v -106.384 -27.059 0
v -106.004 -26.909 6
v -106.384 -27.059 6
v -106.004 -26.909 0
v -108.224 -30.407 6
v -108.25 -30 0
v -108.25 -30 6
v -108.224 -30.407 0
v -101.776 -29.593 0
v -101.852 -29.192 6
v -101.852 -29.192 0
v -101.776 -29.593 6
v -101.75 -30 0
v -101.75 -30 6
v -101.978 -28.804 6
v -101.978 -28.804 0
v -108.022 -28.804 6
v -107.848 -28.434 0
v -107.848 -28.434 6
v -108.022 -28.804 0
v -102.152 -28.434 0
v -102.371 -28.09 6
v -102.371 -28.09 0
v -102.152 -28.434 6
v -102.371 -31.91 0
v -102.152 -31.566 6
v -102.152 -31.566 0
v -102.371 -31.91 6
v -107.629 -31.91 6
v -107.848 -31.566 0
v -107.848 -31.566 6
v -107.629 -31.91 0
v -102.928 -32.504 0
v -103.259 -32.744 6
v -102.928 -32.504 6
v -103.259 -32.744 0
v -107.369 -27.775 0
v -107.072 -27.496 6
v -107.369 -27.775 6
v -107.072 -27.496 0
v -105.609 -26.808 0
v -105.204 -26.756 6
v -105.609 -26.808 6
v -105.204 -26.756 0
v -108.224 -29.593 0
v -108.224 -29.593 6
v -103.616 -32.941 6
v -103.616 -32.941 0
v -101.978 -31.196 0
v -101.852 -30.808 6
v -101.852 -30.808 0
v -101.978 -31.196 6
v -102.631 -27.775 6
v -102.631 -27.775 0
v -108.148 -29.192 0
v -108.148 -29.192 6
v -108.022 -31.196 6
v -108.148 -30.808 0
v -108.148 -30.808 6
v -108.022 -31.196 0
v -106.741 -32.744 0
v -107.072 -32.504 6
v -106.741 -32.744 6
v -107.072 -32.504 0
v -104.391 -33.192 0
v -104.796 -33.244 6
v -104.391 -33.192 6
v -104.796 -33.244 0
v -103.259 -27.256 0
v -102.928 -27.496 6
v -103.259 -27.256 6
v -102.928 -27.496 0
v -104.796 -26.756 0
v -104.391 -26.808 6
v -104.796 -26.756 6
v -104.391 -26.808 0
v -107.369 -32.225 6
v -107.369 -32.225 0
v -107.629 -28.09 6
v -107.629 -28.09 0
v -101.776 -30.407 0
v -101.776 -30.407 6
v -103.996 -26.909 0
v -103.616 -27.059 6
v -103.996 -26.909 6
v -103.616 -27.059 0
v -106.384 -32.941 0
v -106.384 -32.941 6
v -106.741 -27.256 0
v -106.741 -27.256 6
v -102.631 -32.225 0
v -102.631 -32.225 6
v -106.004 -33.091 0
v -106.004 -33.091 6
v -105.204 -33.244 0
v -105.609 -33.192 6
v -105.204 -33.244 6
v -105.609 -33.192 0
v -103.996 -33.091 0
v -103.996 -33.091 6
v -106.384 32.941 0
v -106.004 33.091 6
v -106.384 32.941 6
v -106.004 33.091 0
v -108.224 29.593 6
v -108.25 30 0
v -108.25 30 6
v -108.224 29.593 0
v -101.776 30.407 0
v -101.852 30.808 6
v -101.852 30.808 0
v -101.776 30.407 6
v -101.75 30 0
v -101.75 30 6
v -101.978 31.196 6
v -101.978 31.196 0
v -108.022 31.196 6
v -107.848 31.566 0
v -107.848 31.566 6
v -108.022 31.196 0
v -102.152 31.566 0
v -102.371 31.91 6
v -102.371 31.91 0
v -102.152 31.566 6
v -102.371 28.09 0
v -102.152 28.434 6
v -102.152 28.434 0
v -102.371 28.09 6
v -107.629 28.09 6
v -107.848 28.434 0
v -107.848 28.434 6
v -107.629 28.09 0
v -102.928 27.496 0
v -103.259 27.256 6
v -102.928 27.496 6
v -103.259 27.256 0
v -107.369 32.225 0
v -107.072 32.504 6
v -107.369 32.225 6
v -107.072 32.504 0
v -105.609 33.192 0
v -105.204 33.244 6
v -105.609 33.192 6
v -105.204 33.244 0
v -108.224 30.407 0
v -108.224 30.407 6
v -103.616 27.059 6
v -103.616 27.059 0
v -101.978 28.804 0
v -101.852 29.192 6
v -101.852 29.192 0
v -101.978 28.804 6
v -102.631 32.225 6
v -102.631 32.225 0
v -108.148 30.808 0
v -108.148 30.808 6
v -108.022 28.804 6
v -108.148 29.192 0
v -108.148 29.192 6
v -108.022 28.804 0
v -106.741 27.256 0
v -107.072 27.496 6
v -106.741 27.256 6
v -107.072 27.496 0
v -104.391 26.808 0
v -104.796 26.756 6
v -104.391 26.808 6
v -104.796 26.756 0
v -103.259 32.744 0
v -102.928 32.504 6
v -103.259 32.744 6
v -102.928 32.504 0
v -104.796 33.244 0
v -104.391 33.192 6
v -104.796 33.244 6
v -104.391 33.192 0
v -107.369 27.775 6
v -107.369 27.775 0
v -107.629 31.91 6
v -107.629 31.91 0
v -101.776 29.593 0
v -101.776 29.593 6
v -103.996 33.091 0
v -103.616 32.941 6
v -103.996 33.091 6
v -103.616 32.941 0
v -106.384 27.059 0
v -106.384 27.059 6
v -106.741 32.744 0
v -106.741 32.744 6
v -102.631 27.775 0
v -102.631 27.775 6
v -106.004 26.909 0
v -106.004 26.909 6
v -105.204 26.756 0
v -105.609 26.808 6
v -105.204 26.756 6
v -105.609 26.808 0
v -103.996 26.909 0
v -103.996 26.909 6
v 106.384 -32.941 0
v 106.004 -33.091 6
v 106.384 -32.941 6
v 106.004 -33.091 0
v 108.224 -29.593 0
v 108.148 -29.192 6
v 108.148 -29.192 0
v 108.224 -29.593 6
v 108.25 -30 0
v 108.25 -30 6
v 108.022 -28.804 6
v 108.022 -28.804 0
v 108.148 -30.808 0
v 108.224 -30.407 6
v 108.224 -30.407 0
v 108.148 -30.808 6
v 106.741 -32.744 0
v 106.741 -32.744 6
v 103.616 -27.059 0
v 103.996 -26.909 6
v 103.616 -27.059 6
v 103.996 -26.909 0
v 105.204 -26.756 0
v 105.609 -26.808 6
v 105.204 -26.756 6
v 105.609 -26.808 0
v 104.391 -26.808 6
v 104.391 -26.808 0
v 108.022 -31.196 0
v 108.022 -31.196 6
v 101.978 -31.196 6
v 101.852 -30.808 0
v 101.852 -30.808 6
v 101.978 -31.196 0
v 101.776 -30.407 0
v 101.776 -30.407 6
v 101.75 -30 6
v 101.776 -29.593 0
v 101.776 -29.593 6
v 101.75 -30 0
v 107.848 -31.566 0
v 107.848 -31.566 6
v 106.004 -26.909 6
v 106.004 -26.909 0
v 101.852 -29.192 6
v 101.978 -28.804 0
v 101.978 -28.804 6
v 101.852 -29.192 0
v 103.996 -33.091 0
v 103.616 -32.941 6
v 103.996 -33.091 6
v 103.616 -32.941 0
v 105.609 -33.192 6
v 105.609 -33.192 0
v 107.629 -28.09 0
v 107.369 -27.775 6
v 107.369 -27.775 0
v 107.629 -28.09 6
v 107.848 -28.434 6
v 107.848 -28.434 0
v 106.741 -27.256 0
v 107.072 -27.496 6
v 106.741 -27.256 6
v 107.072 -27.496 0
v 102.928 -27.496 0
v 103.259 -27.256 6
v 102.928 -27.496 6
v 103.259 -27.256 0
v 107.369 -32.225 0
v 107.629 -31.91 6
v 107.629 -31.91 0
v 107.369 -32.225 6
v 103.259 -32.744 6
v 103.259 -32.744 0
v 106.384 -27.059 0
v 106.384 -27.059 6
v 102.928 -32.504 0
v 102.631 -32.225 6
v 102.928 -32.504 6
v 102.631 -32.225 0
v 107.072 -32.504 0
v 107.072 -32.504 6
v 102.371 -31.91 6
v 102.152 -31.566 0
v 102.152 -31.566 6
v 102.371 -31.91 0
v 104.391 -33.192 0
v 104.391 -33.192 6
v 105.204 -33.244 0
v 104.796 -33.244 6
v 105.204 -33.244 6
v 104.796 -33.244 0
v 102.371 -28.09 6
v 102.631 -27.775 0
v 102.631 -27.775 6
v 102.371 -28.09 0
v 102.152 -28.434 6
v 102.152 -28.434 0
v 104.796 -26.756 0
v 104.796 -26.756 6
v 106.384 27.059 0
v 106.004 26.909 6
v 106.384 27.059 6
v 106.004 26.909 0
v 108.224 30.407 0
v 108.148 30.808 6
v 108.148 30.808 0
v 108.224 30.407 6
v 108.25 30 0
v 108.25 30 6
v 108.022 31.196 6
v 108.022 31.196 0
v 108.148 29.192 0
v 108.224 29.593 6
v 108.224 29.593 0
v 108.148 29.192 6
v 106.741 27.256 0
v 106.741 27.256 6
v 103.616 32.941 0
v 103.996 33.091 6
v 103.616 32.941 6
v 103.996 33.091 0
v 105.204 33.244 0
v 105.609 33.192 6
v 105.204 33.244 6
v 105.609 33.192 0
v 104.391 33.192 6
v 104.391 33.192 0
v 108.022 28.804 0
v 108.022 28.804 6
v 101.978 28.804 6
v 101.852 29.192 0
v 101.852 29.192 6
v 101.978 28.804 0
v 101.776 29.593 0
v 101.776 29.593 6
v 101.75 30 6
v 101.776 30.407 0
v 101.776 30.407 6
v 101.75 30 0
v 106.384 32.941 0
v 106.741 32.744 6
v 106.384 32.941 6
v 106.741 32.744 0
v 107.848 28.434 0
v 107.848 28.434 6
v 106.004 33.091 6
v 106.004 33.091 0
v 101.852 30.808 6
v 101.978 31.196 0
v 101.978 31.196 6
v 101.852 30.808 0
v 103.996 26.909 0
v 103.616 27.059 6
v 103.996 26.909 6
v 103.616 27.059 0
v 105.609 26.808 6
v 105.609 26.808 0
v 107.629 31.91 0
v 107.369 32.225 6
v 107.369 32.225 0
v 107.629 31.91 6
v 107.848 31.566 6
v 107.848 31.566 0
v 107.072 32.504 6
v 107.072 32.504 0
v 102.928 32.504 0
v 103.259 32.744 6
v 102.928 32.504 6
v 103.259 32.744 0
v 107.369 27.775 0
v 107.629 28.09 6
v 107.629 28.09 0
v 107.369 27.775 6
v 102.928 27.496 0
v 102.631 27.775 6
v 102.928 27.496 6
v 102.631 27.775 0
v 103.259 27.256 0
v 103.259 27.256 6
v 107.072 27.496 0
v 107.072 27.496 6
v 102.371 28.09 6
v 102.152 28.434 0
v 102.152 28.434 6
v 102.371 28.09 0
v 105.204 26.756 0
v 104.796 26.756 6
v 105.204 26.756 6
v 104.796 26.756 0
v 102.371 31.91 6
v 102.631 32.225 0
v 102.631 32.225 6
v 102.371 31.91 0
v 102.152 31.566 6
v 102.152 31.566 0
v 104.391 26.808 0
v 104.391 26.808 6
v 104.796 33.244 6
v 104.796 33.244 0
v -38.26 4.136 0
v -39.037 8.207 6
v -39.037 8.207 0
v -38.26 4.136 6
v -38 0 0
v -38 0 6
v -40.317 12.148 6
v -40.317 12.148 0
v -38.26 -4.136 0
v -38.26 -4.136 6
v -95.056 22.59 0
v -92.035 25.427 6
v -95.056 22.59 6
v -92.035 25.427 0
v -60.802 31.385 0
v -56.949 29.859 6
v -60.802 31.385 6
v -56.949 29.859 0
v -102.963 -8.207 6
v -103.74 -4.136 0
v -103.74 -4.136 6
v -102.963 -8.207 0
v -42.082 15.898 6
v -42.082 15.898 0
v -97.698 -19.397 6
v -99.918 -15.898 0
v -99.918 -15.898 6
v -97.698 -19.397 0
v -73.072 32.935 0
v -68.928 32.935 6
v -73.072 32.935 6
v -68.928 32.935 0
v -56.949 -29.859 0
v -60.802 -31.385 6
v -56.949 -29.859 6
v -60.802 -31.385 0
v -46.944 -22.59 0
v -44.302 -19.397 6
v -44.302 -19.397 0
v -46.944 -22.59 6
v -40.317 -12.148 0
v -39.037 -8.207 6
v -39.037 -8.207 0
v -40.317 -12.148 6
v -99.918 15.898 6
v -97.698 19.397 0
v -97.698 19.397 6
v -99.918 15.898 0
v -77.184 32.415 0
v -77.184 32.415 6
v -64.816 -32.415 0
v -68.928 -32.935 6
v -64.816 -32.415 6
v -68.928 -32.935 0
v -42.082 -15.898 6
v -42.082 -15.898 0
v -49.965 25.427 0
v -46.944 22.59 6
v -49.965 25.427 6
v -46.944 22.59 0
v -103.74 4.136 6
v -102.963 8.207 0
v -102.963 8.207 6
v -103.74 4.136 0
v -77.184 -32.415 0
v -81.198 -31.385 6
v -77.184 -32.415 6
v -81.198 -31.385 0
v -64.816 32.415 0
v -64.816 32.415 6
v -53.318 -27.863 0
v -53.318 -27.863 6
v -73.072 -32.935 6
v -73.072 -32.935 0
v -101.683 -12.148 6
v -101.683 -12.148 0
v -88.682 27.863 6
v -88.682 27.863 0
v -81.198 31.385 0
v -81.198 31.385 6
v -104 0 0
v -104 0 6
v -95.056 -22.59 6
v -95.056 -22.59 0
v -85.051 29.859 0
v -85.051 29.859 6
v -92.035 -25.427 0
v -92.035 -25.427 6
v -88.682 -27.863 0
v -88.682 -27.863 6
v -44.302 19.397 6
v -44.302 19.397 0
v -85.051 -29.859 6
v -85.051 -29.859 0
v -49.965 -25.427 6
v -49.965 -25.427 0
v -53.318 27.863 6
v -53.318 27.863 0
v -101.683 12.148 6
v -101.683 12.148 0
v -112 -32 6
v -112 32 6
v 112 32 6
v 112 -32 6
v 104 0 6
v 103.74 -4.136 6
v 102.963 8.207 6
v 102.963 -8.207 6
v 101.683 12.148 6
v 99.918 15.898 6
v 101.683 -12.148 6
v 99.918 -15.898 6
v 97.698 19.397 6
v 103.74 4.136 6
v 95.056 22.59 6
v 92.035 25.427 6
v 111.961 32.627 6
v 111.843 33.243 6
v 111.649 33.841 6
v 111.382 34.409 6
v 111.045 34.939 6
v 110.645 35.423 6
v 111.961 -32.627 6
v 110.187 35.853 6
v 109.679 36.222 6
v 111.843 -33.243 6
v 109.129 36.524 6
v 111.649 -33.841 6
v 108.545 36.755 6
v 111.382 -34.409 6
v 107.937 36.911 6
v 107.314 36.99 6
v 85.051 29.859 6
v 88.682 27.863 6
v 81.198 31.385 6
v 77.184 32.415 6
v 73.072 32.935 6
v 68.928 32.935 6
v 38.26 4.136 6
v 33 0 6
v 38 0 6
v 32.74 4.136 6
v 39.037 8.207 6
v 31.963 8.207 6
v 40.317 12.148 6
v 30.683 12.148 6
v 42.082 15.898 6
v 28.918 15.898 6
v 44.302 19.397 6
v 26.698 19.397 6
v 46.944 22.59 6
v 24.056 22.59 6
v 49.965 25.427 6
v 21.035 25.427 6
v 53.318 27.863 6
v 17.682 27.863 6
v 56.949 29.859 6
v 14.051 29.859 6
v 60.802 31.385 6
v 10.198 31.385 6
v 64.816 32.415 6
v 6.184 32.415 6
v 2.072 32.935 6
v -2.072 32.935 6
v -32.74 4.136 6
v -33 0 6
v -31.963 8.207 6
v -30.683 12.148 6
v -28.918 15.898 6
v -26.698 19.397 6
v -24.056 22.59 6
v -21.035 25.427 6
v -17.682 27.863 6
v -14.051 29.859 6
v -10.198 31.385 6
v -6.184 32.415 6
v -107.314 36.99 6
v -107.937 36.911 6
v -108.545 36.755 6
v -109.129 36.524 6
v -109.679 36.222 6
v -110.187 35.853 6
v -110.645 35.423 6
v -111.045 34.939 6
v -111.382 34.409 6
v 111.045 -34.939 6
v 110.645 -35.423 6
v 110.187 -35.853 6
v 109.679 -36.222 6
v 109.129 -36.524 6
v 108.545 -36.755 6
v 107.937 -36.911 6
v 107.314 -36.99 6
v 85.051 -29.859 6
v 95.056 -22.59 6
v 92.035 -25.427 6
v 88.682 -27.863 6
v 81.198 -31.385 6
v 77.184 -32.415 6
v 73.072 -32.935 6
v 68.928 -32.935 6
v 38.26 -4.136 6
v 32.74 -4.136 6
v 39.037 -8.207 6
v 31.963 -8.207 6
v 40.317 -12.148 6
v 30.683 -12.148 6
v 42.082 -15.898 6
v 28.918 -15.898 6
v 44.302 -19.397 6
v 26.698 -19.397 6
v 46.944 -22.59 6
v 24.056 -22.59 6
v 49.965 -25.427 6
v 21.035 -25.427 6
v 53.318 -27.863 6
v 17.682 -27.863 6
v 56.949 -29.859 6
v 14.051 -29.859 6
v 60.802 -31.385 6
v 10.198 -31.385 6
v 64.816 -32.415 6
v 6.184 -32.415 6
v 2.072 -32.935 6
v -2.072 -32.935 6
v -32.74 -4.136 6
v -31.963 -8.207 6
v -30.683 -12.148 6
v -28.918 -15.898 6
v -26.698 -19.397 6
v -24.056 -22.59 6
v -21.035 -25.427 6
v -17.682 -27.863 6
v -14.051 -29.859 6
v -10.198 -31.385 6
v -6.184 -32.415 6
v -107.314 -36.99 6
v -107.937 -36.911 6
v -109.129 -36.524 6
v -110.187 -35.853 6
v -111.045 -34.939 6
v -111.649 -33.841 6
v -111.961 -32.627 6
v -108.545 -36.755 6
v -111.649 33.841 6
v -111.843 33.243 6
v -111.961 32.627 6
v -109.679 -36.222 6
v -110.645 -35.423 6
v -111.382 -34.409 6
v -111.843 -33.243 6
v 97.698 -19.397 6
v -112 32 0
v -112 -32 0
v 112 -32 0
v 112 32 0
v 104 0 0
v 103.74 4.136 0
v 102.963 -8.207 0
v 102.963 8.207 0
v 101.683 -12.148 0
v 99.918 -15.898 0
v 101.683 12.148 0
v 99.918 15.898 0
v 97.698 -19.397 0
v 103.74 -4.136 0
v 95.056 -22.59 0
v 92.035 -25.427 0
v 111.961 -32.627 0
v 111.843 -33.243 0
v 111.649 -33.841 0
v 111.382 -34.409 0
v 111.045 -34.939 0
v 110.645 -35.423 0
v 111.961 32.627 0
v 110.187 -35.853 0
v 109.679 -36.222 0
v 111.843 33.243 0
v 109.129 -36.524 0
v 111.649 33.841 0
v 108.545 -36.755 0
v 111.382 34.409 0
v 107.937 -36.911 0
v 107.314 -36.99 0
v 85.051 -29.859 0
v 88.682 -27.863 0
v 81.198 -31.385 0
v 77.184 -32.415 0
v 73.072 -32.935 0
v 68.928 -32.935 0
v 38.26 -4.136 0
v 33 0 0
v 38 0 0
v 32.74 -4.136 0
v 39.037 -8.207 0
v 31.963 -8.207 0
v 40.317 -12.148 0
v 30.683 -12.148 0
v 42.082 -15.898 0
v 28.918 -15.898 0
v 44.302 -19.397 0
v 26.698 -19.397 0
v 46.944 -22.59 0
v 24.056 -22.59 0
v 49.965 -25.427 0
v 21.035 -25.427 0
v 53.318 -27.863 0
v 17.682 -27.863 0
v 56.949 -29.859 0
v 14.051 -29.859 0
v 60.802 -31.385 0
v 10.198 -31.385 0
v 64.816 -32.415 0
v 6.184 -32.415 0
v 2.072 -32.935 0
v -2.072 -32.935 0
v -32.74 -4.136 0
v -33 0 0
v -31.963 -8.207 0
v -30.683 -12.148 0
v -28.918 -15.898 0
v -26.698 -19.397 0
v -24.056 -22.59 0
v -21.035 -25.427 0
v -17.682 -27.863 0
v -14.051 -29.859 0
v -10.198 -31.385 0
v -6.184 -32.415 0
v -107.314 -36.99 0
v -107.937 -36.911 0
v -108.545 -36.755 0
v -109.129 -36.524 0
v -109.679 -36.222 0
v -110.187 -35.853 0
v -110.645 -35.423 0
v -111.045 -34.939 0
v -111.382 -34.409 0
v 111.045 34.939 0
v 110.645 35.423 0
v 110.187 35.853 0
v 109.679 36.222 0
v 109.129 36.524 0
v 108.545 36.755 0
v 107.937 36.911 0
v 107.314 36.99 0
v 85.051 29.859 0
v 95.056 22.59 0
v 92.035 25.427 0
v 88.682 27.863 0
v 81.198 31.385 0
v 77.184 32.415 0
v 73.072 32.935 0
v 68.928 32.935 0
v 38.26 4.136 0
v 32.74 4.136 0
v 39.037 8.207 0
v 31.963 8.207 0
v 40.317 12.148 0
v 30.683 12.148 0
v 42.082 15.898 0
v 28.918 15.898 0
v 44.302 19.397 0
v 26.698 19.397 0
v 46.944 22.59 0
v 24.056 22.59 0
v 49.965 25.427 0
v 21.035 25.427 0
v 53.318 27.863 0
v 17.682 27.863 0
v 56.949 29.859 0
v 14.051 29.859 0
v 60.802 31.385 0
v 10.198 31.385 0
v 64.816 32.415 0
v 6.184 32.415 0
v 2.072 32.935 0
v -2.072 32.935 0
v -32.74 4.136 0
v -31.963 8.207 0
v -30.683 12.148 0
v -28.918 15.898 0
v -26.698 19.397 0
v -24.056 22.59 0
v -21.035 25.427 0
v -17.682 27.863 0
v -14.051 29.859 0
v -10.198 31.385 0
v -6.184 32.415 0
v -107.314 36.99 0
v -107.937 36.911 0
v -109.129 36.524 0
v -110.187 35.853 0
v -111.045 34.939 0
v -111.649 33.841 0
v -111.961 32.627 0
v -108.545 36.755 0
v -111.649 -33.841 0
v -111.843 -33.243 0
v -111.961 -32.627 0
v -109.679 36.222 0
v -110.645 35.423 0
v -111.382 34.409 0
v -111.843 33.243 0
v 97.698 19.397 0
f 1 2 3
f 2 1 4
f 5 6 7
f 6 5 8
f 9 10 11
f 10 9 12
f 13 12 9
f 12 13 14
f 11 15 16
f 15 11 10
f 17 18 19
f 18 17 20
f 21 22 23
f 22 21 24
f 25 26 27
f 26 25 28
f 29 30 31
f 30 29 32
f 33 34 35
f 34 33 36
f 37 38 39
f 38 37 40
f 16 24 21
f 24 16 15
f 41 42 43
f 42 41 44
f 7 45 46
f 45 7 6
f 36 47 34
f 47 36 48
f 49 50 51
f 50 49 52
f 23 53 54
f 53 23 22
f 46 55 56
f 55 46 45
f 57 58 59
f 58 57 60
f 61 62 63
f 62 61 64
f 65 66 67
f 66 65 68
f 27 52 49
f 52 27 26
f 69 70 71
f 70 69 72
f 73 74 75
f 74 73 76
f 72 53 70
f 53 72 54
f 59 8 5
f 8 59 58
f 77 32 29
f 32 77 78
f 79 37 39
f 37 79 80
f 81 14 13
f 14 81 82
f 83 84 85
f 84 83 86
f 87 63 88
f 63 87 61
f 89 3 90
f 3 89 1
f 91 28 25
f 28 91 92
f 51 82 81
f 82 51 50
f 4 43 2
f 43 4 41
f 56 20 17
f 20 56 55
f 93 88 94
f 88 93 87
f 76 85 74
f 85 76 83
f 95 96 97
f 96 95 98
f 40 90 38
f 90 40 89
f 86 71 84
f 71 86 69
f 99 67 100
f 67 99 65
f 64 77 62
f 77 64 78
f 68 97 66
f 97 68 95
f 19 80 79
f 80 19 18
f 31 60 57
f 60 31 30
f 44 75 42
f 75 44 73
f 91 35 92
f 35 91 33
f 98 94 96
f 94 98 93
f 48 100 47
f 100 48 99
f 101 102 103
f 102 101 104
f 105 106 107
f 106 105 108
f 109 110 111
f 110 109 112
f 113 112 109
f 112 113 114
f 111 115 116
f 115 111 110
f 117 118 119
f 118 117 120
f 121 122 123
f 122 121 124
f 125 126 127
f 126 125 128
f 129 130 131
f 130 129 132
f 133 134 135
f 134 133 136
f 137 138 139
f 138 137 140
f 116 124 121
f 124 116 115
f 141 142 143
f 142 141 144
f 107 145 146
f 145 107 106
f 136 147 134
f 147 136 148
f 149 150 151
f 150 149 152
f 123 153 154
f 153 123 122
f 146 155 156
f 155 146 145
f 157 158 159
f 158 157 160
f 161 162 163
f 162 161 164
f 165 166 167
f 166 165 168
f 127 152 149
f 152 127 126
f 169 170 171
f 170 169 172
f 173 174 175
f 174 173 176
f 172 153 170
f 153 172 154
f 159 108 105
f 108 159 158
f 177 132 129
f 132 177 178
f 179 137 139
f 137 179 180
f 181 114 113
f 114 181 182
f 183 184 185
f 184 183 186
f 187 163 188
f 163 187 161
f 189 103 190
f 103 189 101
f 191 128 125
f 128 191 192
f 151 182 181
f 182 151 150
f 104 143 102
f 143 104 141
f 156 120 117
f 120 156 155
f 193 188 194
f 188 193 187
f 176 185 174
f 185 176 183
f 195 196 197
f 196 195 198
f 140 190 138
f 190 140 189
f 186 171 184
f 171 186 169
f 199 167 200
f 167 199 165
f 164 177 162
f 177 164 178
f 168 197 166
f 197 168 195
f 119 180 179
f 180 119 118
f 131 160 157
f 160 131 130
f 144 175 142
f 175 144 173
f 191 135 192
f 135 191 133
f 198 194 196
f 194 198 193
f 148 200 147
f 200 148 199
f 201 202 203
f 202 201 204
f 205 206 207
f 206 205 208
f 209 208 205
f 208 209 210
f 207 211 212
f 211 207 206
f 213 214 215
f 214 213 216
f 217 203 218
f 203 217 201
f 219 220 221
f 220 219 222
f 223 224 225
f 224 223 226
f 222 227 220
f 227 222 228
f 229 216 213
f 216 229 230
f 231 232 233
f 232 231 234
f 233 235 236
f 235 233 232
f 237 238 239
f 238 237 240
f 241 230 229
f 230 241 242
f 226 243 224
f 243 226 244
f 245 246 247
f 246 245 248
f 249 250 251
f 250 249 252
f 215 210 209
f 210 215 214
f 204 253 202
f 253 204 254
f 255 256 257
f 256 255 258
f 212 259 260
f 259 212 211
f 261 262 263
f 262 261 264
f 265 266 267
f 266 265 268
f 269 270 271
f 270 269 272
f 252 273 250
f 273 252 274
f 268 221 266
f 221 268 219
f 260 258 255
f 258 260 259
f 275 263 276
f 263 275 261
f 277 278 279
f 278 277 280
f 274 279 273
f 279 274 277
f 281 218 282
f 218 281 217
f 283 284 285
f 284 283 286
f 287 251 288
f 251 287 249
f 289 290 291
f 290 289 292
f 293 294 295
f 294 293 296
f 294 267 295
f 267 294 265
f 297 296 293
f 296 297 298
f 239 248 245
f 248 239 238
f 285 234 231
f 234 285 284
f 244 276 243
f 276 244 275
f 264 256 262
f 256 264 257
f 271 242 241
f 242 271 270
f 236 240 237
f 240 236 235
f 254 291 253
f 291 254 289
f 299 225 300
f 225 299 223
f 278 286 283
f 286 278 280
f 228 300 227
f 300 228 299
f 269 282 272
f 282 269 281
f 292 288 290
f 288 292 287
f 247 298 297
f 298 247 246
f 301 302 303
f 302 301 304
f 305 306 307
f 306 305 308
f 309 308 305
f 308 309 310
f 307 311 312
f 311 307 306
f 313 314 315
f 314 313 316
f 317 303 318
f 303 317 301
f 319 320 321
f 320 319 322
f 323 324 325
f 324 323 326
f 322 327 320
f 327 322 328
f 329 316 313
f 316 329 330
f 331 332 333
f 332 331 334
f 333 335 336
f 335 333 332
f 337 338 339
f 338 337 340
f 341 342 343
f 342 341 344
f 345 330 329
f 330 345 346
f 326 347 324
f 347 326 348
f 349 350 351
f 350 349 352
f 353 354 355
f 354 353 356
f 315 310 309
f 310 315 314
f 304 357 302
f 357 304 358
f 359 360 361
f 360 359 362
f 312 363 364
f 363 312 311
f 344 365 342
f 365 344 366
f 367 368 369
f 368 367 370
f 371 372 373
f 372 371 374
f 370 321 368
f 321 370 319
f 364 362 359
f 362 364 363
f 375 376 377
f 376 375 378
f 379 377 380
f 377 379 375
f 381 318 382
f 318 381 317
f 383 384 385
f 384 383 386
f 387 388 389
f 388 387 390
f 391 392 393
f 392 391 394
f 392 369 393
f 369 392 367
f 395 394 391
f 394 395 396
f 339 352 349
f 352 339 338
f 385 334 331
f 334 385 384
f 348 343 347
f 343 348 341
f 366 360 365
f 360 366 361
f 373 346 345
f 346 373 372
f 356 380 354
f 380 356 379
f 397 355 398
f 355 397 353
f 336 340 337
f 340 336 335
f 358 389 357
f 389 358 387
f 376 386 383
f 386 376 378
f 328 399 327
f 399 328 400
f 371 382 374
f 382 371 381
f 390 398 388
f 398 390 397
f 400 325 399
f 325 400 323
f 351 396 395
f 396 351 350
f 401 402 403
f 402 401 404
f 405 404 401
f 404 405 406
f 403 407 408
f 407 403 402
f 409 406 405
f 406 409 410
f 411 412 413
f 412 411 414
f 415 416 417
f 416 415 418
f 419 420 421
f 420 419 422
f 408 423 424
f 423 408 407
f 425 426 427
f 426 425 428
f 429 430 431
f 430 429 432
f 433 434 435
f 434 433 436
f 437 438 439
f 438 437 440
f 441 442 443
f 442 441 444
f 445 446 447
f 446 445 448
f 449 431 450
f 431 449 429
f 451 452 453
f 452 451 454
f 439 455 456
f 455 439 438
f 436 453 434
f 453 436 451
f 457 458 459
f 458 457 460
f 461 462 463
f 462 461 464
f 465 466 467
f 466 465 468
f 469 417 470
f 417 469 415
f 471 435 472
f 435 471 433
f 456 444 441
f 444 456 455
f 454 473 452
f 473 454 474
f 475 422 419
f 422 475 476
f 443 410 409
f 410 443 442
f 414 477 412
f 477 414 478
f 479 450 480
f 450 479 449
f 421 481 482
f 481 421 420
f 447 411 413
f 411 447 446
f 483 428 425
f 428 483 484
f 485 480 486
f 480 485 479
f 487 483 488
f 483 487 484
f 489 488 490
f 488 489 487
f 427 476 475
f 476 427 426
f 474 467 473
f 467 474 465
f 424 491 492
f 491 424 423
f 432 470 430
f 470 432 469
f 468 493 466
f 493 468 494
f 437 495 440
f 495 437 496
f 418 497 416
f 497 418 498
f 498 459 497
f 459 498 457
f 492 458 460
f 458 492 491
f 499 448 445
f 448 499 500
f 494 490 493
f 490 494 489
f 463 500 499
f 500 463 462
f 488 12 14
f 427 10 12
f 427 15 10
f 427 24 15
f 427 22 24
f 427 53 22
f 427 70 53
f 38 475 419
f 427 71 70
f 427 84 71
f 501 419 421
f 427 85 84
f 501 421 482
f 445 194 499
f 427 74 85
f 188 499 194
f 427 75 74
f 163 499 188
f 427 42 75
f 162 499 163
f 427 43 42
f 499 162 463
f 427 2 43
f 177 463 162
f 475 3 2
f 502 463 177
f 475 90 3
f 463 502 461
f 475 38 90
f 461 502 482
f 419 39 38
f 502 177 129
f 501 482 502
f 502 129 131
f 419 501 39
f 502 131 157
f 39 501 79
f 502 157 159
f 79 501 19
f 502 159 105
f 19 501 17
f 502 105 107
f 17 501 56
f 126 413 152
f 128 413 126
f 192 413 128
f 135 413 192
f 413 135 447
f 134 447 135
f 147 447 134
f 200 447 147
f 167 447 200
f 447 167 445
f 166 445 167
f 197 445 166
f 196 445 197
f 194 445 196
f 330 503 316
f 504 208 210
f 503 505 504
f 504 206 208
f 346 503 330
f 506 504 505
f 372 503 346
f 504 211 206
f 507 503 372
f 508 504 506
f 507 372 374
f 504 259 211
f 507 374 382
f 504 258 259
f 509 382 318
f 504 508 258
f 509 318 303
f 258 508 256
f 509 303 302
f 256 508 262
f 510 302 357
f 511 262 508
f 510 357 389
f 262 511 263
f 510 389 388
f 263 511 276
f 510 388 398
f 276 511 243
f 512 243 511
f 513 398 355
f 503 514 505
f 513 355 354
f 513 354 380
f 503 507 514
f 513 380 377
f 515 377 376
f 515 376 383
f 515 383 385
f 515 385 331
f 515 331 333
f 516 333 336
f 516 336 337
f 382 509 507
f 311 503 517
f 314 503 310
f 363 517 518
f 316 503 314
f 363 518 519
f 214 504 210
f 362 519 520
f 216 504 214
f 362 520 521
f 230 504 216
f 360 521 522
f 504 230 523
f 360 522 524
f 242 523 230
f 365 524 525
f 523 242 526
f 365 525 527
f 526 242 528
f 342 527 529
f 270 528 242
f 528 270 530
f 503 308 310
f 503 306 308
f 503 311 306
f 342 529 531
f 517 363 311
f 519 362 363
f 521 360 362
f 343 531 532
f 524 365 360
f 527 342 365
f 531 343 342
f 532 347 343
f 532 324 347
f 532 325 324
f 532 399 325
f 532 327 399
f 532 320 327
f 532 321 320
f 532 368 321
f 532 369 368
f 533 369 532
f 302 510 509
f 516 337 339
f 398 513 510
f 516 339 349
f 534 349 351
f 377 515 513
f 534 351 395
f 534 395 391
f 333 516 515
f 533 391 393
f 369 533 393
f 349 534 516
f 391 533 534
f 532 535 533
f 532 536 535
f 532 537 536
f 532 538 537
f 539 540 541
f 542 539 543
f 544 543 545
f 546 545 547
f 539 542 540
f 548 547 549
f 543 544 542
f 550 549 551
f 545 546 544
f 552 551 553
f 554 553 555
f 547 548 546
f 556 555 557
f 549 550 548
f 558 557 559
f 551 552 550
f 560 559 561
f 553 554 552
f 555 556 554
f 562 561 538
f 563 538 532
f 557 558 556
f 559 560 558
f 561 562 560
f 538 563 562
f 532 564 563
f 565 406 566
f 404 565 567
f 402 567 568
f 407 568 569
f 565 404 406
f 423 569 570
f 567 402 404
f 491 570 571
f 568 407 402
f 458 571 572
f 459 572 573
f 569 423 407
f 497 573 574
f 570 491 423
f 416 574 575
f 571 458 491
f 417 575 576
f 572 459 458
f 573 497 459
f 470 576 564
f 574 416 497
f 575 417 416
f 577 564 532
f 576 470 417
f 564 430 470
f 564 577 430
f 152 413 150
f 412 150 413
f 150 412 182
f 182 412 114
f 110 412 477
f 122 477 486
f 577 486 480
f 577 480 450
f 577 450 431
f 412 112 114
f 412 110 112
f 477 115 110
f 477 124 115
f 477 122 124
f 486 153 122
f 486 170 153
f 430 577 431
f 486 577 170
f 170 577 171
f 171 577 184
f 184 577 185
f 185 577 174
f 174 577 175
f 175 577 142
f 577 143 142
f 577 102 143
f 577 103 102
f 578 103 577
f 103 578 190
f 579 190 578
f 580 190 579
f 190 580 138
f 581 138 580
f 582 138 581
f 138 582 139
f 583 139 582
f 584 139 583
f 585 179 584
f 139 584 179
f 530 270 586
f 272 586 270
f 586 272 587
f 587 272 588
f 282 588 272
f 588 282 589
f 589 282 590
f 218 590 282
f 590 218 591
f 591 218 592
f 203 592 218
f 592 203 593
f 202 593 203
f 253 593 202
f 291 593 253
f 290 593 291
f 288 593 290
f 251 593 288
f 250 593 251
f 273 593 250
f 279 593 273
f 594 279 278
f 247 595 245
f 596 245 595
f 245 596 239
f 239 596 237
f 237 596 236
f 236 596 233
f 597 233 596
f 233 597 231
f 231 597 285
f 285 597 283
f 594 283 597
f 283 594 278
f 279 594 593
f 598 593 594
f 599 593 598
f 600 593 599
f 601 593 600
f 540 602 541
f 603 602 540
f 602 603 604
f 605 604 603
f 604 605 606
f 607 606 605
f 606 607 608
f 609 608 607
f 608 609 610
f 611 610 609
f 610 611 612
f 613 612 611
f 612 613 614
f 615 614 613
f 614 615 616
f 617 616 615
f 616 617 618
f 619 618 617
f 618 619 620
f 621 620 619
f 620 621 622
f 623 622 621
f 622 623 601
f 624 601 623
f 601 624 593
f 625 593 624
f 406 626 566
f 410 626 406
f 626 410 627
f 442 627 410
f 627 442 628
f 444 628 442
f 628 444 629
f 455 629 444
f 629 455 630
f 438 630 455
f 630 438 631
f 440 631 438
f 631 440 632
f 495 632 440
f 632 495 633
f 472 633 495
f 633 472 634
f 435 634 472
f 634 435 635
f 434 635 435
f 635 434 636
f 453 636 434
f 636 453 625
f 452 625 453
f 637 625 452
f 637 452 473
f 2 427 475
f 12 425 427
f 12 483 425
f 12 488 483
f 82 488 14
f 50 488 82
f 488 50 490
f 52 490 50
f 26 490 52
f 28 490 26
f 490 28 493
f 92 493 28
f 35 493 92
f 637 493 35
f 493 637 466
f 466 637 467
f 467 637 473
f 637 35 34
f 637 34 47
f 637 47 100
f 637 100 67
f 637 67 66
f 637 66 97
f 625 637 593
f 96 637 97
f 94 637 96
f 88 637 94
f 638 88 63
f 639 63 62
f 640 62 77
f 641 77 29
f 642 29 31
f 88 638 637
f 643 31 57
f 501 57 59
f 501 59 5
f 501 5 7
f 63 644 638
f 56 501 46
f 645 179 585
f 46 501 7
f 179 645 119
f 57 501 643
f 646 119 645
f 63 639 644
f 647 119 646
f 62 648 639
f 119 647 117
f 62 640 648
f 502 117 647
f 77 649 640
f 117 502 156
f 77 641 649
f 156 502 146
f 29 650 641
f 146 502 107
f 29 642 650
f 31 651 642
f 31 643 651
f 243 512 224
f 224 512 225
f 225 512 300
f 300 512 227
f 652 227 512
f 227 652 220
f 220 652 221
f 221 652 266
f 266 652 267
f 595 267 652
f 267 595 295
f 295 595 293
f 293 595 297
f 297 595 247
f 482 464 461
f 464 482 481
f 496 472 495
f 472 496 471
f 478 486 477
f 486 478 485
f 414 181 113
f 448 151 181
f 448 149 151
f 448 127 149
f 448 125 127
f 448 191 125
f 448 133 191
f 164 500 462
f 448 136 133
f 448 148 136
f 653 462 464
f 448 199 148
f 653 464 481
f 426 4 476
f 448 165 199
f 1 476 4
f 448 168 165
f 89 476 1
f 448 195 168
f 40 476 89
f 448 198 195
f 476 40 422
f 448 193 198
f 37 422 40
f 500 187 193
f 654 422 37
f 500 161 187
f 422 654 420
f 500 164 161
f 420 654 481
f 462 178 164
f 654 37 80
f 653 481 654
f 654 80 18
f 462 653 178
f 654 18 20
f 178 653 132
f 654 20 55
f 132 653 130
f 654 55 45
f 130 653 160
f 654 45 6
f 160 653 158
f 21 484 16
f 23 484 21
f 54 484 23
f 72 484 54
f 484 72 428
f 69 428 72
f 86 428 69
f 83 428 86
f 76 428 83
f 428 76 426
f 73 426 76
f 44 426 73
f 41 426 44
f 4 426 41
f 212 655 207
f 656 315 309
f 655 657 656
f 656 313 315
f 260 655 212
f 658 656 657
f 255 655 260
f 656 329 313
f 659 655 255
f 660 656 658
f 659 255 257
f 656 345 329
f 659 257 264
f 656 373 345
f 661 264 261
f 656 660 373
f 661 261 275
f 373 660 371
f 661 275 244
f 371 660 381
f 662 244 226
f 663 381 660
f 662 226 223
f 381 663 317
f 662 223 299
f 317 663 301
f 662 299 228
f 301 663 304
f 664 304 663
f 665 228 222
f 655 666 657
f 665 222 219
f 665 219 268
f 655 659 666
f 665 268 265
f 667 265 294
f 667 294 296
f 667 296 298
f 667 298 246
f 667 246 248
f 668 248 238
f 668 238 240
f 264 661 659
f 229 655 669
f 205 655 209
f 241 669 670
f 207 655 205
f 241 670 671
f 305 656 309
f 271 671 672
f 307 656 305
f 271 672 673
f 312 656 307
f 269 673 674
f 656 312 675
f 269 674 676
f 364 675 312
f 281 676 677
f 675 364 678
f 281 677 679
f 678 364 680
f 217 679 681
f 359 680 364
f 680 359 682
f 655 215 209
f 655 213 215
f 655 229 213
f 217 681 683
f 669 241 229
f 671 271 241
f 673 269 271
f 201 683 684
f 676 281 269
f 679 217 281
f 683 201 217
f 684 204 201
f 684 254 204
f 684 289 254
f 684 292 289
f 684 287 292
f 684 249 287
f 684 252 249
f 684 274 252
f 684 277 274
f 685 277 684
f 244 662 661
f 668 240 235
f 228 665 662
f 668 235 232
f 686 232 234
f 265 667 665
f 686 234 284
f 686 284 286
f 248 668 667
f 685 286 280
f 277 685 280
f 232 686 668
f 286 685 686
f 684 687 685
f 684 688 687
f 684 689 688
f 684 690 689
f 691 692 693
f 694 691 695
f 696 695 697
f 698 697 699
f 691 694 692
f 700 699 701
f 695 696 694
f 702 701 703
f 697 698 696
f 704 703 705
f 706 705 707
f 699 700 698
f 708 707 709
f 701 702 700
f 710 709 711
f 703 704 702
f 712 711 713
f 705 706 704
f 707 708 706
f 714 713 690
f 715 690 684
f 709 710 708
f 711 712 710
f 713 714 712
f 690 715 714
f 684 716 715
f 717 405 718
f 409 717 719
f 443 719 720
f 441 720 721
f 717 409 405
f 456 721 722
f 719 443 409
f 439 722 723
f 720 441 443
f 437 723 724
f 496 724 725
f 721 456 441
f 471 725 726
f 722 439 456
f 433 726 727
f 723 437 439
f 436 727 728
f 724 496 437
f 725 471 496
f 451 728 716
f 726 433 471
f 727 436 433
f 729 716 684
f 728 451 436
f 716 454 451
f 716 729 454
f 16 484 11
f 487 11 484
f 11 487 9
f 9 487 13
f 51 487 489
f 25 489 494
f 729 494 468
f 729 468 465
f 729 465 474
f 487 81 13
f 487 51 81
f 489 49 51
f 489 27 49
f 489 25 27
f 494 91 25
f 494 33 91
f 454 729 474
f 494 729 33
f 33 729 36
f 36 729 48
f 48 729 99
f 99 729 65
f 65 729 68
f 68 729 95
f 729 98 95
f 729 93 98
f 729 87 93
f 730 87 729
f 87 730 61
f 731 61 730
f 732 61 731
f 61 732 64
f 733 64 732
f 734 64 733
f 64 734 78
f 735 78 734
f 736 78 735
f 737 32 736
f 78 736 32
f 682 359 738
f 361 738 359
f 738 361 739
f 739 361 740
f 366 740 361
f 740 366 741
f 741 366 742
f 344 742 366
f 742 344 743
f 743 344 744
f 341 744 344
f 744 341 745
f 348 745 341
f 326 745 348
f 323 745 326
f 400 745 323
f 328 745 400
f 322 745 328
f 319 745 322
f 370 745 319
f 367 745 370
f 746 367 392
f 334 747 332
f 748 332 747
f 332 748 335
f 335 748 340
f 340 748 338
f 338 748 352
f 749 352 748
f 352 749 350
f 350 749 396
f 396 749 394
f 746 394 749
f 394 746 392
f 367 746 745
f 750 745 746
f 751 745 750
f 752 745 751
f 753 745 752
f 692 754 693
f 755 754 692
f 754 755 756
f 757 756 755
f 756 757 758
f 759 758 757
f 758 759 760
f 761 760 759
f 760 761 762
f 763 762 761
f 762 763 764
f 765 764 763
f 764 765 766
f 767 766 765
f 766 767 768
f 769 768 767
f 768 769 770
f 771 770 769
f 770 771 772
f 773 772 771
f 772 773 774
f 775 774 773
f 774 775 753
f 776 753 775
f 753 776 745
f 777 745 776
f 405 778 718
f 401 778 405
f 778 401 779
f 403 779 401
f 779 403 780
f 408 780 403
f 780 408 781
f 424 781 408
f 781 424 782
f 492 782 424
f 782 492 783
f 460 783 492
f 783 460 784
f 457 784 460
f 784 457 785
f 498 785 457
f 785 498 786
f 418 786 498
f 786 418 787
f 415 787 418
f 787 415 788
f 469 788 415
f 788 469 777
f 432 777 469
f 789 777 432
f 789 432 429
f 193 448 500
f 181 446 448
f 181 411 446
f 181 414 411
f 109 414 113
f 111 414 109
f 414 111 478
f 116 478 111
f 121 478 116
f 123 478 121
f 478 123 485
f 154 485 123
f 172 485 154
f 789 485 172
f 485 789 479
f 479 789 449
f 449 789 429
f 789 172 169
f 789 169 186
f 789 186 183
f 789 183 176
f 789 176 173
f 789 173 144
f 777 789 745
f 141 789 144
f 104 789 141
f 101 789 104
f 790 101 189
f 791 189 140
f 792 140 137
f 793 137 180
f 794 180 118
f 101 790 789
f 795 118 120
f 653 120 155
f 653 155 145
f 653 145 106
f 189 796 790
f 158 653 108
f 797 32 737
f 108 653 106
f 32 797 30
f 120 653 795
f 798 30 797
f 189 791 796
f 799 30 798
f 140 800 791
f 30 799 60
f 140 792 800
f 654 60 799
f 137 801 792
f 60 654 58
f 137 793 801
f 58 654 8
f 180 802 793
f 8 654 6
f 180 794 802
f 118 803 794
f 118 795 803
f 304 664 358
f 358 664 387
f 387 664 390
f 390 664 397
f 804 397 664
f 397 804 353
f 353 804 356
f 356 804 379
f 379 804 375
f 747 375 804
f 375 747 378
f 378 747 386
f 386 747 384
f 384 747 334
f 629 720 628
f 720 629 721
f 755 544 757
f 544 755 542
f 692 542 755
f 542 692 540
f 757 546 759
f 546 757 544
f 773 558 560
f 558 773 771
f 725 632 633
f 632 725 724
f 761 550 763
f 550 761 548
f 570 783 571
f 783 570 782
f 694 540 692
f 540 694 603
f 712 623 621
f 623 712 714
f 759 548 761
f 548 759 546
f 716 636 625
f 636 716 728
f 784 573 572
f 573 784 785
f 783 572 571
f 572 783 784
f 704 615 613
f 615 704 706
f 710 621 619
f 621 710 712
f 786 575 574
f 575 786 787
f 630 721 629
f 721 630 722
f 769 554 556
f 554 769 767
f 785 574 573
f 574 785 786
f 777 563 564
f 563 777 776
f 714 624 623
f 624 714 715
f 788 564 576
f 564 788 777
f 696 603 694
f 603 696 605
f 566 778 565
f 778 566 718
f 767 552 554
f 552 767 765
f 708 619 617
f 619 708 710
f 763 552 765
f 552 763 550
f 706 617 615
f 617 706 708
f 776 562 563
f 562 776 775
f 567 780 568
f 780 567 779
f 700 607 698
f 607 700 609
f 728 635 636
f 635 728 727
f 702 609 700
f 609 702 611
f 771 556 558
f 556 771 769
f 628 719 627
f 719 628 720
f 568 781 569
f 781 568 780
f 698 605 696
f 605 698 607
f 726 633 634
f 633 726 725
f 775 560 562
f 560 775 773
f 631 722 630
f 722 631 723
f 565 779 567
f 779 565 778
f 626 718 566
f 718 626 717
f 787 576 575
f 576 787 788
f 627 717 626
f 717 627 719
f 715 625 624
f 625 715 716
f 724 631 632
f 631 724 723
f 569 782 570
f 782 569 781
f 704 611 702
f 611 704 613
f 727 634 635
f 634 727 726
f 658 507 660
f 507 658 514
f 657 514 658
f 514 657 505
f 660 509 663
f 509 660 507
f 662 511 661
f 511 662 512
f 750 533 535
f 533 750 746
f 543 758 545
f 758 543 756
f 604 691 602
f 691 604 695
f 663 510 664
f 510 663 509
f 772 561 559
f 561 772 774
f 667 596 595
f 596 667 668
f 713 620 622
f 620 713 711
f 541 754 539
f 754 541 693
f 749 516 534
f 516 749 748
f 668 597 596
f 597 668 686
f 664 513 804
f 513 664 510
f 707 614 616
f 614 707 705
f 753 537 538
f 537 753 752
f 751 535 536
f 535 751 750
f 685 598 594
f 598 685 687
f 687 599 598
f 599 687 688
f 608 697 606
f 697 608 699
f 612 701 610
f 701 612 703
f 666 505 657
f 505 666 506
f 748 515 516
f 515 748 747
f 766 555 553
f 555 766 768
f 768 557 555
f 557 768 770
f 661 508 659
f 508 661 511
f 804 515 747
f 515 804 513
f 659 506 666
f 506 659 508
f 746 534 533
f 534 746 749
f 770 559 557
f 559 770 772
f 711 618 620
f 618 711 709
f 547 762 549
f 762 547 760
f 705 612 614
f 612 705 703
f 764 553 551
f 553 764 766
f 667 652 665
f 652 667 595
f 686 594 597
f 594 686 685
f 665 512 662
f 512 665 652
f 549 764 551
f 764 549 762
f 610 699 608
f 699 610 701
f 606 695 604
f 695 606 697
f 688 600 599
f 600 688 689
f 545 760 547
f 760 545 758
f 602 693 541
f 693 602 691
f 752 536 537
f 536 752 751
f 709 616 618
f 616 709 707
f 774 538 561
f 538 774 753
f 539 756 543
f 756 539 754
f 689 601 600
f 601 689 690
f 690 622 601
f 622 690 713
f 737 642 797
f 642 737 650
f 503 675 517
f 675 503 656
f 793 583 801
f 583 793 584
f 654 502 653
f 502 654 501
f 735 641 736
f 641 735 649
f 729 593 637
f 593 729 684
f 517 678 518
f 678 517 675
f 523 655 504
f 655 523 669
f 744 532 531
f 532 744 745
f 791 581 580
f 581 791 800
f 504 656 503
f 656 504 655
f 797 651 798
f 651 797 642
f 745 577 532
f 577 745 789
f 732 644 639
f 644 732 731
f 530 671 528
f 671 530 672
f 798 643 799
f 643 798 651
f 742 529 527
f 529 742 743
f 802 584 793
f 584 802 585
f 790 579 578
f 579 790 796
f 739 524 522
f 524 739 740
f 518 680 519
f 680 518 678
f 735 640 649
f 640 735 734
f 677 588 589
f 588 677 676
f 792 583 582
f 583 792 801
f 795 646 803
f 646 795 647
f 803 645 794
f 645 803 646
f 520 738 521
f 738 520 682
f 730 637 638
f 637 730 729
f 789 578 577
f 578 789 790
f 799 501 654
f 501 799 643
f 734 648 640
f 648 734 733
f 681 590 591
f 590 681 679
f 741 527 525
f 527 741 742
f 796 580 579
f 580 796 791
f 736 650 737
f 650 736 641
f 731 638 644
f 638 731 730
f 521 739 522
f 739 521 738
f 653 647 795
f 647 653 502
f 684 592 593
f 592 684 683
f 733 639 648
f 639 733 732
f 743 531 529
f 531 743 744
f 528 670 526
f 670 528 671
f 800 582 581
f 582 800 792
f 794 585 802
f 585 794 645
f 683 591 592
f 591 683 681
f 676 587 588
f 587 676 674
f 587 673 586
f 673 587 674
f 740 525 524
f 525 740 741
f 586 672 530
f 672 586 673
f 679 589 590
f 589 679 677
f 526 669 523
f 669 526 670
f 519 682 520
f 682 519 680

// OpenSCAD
$fn = 50;


difference() {
	union() {
		hull() {
			translate(v = [-107.0000000000, 32.0000000000, 0]) {
				cylinder(h = 6, r = 5);
			}
			translate(v = [107.0000000000, 32.0000000000, 0]) {
				cylinder(h = 6, r = 5);
			}
			translate(v = [-107.0000000000, -32.0000000000, 0]) {
				cylinder(h = 6, r = 5);
			}
			translate(v = [107.0000000000, -32.0000000000, 0]) {
				cylinder(h = 6, r = 5);
			}
		}
	}
	union() {
		#translate(v = [-105.0000000000, -30.0000000000, -100.0000000000]) {
			cylinder(h = 200, r = 3.2500000000);
		}
		#translate(v = [-105.0000000000, 30.0000000000, -100.0000000000]) {
			cylinder(h = 200, r = 3.2500000000);
		}
		#translate(v = [105.0000000000, -30.0000000000, -100.0000000000]) {
			cylinder(h = 200, r = 3.2500000000);
		}
		#translate(v = [105.0000000000, 30.0000000000, -100.0000000000]) {
			cylinder(h = 200, r = 3.2500000000);
		}
		#translate(v = [-71.0000000000, 0, 0]) {
			cylinder(h = 6, r = 33.0000000000);
		}
		#cylinder(h = 6, r = 33.0000000000);
		#translate(v = [71.0000000000, 0, 0]) {
			cylinder(h = 6, r = 33.0000000000);
		}
	}
}
